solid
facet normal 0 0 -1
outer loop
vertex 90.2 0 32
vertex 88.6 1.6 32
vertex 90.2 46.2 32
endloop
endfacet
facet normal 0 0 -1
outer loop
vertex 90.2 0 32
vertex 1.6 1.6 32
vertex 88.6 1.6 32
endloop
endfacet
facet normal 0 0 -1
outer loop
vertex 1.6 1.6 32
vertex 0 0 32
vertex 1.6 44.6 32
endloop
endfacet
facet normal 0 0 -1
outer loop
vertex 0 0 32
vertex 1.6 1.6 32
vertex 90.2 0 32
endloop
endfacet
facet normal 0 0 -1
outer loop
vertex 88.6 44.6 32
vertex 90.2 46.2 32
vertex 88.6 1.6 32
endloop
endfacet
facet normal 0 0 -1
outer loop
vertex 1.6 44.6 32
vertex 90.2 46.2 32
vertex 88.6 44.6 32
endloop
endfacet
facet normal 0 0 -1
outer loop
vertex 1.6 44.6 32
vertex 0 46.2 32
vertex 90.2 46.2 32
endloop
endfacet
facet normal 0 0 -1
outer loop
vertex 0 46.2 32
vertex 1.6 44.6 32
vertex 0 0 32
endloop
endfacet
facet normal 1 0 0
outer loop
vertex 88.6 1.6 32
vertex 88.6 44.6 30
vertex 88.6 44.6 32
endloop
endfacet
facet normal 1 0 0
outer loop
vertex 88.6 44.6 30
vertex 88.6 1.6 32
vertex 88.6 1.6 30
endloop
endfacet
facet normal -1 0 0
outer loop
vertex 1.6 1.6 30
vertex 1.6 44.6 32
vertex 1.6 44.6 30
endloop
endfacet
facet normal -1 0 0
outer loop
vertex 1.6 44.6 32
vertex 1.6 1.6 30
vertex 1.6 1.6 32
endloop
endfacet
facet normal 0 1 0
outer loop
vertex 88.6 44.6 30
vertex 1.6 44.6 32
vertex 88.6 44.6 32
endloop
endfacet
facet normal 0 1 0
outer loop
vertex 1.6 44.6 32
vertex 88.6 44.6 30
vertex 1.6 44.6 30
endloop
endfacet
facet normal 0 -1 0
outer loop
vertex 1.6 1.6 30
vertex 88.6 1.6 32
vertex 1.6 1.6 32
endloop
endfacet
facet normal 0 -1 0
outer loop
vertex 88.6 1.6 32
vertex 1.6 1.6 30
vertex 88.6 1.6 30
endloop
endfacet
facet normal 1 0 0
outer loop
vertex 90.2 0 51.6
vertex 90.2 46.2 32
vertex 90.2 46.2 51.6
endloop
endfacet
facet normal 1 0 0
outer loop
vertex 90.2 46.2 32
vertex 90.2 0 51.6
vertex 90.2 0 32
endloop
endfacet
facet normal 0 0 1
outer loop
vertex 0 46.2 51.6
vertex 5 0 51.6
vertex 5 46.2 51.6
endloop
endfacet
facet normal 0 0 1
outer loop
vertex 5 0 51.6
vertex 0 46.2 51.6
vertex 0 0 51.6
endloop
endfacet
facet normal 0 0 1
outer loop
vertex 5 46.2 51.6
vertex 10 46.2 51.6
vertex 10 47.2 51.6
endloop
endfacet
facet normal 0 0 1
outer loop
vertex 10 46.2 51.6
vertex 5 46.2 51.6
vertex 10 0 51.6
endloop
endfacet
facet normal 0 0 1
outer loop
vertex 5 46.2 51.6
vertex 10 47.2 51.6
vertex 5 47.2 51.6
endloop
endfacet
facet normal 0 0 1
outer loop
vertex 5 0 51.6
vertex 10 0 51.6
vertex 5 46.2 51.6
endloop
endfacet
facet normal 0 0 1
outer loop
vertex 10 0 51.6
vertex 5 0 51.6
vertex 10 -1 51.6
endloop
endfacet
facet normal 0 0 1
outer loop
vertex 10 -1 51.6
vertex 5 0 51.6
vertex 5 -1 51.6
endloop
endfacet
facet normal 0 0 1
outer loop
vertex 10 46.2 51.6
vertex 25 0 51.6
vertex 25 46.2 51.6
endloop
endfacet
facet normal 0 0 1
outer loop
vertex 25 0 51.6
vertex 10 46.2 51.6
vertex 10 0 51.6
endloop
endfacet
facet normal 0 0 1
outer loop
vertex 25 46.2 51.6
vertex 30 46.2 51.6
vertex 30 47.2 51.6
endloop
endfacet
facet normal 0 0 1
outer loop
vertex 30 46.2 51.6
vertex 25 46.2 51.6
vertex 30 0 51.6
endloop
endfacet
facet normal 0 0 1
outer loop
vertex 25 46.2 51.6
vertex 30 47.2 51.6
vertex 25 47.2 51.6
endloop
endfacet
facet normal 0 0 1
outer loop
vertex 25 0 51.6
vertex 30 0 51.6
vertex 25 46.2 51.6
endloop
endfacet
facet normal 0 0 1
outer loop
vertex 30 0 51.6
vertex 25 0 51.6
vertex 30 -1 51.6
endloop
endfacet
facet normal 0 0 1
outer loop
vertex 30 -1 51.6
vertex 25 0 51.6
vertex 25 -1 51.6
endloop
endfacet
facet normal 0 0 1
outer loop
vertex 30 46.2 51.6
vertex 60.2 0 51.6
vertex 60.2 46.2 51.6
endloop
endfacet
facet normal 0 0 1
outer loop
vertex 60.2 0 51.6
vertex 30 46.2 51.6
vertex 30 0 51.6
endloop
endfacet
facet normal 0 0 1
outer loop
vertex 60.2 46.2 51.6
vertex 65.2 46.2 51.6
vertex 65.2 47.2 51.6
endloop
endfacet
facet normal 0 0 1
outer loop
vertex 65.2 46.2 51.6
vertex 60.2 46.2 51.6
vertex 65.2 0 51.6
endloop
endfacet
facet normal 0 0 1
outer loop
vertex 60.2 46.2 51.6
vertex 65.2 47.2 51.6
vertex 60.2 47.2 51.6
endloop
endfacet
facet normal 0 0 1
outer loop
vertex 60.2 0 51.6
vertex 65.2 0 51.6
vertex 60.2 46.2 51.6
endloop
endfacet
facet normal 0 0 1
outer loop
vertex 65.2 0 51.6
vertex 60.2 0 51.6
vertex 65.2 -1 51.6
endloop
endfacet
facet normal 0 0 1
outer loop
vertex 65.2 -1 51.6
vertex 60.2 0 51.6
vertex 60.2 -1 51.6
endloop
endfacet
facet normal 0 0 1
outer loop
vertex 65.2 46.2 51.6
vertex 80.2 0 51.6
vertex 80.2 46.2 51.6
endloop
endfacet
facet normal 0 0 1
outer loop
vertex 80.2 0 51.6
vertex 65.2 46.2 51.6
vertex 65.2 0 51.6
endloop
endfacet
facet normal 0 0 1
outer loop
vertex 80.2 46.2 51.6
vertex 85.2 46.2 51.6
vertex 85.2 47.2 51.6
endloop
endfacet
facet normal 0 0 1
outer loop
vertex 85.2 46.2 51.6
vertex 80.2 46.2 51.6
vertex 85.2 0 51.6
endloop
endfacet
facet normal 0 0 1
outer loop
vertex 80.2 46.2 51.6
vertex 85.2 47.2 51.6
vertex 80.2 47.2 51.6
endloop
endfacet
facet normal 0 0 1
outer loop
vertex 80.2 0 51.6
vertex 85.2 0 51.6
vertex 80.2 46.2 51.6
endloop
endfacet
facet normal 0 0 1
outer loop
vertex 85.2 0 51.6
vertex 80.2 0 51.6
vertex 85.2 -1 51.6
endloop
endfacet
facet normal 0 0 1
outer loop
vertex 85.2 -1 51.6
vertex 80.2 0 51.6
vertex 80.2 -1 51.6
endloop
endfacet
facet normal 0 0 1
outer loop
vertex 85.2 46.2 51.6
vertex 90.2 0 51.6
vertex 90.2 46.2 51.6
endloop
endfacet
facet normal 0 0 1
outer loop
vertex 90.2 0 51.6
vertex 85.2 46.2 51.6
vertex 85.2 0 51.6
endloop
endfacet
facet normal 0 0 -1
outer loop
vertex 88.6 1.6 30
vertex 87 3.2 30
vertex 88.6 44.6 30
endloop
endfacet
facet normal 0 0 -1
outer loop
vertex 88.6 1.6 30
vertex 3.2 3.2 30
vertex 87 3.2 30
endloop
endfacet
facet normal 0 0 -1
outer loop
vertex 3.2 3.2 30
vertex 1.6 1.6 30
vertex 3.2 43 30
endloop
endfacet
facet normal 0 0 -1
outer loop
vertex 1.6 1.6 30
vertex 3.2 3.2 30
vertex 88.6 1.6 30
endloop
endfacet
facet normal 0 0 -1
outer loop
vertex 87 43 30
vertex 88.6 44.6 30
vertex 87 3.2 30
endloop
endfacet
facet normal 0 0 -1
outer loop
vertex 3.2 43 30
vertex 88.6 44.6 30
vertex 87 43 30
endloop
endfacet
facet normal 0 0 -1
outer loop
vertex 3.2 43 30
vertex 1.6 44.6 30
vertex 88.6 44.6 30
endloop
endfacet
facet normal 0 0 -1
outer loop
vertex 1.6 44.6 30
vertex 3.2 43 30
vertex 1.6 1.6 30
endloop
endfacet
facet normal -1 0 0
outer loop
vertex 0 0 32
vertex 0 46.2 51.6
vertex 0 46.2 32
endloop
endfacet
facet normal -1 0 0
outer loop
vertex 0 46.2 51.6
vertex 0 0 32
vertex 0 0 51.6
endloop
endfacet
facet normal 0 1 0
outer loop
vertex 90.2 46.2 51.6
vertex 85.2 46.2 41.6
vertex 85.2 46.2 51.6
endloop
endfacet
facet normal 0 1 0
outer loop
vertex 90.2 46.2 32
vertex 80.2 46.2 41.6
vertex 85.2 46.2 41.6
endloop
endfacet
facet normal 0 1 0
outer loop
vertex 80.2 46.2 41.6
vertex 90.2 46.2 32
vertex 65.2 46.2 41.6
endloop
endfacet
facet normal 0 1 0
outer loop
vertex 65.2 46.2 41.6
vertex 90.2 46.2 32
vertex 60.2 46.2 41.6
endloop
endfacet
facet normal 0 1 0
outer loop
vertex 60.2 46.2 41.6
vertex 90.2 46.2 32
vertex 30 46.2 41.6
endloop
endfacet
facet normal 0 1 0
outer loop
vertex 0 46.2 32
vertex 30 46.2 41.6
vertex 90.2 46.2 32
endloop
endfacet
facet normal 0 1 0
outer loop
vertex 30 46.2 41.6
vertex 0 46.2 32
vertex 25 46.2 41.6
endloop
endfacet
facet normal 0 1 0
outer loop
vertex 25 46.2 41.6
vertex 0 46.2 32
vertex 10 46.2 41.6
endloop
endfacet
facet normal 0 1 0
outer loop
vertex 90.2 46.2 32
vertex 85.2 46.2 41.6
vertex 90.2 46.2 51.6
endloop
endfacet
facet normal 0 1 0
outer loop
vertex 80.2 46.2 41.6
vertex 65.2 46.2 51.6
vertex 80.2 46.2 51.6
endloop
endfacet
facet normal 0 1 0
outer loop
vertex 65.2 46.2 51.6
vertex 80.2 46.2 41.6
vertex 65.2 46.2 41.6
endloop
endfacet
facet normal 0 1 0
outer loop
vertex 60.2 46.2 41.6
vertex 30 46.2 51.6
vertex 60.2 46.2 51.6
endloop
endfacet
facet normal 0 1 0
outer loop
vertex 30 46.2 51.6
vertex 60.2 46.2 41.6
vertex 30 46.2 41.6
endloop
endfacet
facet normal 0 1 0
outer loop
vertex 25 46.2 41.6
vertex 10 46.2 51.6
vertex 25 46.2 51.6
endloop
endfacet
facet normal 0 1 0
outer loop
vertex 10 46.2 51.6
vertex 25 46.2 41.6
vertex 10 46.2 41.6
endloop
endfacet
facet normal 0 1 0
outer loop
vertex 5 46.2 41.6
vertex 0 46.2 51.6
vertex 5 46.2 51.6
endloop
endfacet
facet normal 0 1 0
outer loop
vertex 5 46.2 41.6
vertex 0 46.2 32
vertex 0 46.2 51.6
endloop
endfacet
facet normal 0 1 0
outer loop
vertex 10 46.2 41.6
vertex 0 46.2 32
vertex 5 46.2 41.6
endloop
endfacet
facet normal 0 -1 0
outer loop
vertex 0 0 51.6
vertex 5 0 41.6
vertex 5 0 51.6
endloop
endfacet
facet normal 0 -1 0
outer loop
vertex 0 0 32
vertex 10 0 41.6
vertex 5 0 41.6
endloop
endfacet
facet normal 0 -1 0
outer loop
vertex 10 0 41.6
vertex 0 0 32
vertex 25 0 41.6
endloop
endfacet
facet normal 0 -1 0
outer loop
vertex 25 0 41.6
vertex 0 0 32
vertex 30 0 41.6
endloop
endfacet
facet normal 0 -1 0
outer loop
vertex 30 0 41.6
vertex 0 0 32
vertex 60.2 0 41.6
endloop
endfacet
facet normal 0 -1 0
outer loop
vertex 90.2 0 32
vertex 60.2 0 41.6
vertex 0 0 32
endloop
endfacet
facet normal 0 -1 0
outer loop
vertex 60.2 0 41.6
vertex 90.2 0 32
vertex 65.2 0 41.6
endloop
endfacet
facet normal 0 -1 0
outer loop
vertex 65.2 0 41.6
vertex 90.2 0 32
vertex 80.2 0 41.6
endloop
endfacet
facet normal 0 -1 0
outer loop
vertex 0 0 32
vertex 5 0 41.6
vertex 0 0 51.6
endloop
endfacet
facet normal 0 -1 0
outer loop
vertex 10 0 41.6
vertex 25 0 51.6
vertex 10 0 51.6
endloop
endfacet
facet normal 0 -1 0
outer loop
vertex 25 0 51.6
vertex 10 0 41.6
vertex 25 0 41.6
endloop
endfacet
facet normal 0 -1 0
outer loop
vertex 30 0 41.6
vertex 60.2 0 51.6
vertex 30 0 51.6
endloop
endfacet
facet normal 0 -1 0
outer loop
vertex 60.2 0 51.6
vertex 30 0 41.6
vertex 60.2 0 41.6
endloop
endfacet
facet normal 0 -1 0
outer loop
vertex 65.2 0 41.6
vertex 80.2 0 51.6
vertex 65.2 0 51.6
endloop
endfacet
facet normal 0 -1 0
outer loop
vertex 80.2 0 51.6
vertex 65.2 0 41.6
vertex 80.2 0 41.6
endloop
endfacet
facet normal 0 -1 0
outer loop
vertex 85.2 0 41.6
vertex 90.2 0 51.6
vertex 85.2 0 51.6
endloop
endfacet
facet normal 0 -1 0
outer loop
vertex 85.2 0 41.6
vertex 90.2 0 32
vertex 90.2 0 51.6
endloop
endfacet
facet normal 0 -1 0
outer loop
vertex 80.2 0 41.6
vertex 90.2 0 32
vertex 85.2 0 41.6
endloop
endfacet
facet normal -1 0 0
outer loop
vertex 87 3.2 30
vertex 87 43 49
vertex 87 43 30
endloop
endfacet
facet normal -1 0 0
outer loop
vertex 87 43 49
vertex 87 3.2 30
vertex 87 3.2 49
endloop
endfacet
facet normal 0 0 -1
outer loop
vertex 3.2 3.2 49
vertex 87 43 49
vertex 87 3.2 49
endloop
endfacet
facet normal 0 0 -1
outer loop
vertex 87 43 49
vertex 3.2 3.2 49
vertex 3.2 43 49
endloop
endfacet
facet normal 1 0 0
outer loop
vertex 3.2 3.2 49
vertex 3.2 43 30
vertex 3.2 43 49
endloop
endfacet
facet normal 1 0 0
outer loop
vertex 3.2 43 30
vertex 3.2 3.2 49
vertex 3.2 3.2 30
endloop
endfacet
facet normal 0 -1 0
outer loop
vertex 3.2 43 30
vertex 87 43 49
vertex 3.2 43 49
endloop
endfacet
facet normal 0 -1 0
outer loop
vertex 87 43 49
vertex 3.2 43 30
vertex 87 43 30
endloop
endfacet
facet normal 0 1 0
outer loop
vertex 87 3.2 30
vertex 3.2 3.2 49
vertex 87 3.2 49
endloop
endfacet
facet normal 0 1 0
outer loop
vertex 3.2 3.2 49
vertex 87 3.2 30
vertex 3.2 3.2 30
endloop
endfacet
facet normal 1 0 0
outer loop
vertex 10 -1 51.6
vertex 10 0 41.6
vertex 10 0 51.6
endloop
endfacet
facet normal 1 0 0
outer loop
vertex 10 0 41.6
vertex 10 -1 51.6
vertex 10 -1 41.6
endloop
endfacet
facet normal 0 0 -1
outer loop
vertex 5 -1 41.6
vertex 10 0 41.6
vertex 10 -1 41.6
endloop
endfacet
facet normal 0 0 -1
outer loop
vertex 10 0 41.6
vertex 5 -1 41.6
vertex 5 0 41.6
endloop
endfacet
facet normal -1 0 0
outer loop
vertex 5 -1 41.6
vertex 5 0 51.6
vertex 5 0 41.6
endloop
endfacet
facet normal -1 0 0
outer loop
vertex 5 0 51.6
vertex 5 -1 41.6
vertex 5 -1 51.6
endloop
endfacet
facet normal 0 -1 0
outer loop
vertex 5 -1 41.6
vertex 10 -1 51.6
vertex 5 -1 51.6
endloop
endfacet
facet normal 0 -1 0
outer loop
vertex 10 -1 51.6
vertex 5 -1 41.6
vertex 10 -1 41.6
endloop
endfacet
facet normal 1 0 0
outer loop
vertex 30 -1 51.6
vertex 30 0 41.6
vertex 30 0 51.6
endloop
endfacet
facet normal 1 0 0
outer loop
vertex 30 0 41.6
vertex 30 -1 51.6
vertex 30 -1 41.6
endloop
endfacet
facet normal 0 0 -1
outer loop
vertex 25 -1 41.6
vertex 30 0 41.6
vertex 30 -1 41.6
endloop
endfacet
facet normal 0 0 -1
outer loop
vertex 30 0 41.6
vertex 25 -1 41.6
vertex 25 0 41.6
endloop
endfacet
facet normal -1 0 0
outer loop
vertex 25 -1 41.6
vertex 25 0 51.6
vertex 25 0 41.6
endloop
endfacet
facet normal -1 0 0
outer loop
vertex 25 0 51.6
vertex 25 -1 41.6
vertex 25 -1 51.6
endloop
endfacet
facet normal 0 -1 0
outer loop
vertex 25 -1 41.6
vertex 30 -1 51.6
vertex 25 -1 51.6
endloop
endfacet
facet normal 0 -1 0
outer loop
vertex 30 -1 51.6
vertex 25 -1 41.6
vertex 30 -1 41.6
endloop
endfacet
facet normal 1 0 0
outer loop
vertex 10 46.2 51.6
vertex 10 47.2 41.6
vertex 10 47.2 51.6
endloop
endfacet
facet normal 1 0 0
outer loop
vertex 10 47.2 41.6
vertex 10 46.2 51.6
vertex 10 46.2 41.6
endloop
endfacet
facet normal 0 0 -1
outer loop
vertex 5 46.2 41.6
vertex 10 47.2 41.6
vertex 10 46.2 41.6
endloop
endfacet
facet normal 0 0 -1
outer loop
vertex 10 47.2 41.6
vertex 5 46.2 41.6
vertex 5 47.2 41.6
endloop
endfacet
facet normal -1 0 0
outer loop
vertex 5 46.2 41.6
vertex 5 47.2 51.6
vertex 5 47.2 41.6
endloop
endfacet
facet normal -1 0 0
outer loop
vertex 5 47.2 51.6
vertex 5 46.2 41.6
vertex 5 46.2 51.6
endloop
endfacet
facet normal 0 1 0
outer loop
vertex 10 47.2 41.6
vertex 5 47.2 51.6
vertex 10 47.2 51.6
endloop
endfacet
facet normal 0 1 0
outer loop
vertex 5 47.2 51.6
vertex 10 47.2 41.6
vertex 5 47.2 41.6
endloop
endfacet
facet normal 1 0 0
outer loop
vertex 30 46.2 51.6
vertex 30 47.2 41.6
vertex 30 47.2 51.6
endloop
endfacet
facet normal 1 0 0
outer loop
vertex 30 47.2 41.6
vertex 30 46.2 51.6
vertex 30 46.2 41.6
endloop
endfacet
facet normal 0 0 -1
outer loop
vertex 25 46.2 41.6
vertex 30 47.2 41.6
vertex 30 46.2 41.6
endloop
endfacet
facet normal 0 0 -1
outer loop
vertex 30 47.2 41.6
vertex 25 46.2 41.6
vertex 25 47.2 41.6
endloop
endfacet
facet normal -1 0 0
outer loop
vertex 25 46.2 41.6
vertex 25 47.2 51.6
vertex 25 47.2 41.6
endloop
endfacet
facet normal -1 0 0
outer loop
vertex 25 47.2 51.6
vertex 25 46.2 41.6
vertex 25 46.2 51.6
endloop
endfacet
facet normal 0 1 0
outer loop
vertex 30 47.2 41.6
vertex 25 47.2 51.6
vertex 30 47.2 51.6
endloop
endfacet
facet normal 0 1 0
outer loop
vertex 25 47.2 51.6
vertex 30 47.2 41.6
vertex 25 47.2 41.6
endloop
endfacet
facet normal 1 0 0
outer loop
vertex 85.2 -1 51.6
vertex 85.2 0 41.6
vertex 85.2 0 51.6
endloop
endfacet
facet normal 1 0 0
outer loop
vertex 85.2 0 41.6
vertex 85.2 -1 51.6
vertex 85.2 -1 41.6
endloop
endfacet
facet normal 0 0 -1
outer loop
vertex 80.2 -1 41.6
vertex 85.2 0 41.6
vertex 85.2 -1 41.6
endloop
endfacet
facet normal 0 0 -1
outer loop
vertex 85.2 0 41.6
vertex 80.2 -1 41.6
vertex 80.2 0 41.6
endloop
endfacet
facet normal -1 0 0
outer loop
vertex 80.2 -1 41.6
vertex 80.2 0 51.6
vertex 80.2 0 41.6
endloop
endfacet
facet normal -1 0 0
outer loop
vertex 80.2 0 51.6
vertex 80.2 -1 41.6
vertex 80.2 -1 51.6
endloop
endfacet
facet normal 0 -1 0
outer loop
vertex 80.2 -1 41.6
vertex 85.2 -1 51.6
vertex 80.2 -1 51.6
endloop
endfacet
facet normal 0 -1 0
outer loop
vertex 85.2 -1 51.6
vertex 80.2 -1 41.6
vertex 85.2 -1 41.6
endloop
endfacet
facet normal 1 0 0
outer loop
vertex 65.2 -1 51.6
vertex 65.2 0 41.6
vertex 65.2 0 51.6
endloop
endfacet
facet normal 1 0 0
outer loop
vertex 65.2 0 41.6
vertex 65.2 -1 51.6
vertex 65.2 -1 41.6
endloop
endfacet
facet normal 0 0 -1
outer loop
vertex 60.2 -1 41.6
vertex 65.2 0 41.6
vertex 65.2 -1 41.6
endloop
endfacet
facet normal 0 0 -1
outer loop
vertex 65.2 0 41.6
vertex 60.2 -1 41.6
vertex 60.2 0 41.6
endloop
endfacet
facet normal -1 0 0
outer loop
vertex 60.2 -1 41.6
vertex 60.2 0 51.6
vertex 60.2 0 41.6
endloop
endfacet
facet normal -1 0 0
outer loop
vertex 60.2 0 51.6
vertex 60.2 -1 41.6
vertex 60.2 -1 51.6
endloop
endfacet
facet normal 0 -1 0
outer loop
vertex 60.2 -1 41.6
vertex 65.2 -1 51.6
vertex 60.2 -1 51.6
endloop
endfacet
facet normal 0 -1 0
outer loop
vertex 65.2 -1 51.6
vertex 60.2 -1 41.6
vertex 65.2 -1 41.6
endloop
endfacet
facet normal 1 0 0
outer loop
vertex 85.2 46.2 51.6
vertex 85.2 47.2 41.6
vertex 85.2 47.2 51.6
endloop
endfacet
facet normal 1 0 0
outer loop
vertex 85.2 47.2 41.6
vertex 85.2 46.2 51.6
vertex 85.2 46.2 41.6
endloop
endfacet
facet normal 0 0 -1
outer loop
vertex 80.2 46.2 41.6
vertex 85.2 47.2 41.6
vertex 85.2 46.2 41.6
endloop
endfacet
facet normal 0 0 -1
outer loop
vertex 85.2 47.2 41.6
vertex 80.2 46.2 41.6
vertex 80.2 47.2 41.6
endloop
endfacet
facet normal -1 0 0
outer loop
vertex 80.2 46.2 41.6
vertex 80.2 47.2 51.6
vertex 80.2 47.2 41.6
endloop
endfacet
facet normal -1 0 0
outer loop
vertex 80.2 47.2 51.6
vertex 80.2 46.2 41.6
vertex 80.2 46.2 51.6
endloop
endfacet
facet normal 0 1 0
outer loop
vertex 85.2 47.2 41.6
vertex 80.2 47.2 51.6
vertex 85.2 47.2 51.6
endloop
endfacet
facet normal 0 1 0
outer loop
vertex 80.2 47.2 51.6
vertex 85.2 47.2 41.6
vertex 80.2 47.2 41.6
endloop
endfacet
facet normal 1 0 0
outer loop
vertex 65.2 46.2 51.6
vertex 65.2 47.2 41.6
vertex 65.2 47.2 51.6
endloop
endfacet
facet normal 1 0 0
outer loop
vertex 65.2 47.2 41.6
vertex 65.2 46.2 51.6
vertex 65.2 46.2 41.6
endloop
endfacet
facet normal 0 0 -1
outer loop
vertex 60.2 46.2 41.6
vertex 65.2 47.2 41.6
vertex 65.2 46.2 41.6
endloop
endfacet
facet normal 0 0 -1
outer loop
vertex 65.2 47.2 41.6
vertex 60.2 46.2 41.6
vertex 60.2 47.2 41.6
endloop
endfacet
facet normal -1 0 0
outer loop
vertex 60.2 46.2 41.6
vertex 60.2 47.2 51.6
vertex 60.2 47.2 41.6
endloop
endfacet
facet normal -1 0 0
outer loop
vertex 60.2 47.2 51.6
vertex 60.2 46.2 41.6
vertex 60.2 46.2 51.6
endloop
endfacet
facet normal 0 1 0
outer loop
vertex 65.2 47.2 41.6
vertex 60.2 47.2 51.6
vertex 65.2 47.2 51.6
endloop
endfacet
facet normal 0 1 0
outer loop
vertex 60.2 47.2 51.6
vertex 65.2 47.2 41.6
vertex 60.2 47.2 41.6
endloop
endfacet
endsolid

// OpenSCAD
tol = 0.8;
wall_thickness = 2.6;
small_dropout_height = 5.1;
dropout_length = 54;
dropout_width = 41;
dropout_height = 9.3;
allen_length = 85;
allen_width = 32.2;
allen_height = 5.7;
multitool_length = 78;
multitool_width = 40;
multitool_height = 15.5;
object_skip = 0.5;
base_height = small_dropout_height + allen_height + multitool_height + wall_thickness + 2 * object_skip + 0.1;
full_width = dropout_width + 2 * wall_thickness;
full_length = allen_length + 2 * wall_thickness;
guide_wall_width = 1.2;
guide_wall_height = 2;

module bottom() {
	difference() {
		cube( [ full_length, full_width, base_height ] );
		translate( [ ( full_length - dropout_length - tol ) / 2, ( full_width - dropout_width - tol ) / 2, wall_thickness ] ) {
			cube( [ dropout_length + tol, dropout_width + tol, base_height ] );
		}
		translate( [ ( full_length - allen_length - tol ) / 2, ( full_width - allen_width - tol ) / 2, wall_thickness + small_dropout_height + object_skip ] ) {
			cube( [ allen_length + tol, allen_width + tol, base_height ] );
		}
		translate( [ ( full_length - multitool_length - tol ) / 2, ( full_width - multitool_width - tol ) / 2, wall_thickness + small_dropout_height + allen_height + 2 * object_skip ] ) {
			cube( [ multitool_length + tol, multitool_width + tol, base_height ] );
		}
	}
	difference() {
		translate( [ 0, 0, base_height ] ) {
			cube( [ full_length, full_width, guide_wall_height ] );
		}
		translate( [ guide_wall_width, guide_wall_width, base_height - 0.1 ] ) {
			cube( [ full_length - 2 * guide_wall_width, full_width - 2 * guide_wall_width, guide_wall_height + 0.2 ] );
		}
	}
	half_diameter = 50;
	difference() {
		translate( [ 0, 0, -5 ] )
			cube( [ full_length, full_width, 5 ] );
		translate( [ -0.1, full_width / 2, -half_diameter ] )
			rotate( 90, [ 0, 1, 0 ] )
				cylinder( r = half_diameter, h = 110, $fn = 50 );
	}
}

lube_length = 83;
lube_body_length = 54;
lube_width = 39;
lube_height = 19;
removed_width = 2 * guide_wall_width + tol;
stripe_width = 20;
stripe_height = 1;
module top() {
	difference() {
		translate( [ 0, 0, base_height ] )
			cube( [ full_length, full_width, lube_height + wall_thickness ] );
		translate( [ ( full_length - lube_length - tol ) / 2, ( full_width - lube_width - tol ) / 2, base_height - 0.1 ] )
			cube( [ lube_length + tol, lube_width + tol, lube_height + 0.1 ] );
	
		difference() {
			translate( [ -0.1, -0.1, base_height - 0.01 ] )
					cube( [ full_length + 0.2, full_width + 0.2, guide_wall_height + 0.01 ] );
			translate( [ removed_width / 2, removed_width / 2, base_height - 0.1 ] )
					cube( [ full_length - removed_width, full_width - removed_width, guide_wall_height + 0.1 ] );
		}
	}

	translate( [ 5, -stripe_height, base_height + lube_height + wall_thickness - 10 ] )
		cube( [ 5, stripe_height, 10 ] );
	translate( [ 5 + stripe_width, -stripe_height, base_height + lube_height + wall_thickness - 10 ] )
		cube( [ 5, stripe_height, 10 ] );

	translate( [ 5, full_width, base_height + lube_height + wall_thickness - 10 ] )
		cube( [ 5, stripe_height, 10 ] );
	translate( [ 5 + stripe_width, full_width, base_height + lube_height + wall_thickness - 10 ] )
		cube( [ 5, stripe_height, 10 ] );

	translate( [ full_length - 10, -stripe_height, base_height + lube_height + wall_thickness - 10 ] )
		cube( [ 5, stripe_height, 10 ] );
	translate( [ full_length - 10 - stripe_width, -stripe_height, base_height + lube_height + wall_thickness - 10 ] )
		cube( [ 5, stripe_height, 10 ] );

	translate( [ full_length - 10, full_width, base_height + lube_height + wall_thickness - 10 ] )
		cube( [ 5, stripe_height, 10 ] );
	translate( [ full_length - 10 - stripe_width, full_width, base_height + lube_height + wall_thickness - 10 ] )
		cube( [ 5, stripe_height, 10 ] );
}

//translate( [ 0, 0, 3 ] )
top();
//bottom();
